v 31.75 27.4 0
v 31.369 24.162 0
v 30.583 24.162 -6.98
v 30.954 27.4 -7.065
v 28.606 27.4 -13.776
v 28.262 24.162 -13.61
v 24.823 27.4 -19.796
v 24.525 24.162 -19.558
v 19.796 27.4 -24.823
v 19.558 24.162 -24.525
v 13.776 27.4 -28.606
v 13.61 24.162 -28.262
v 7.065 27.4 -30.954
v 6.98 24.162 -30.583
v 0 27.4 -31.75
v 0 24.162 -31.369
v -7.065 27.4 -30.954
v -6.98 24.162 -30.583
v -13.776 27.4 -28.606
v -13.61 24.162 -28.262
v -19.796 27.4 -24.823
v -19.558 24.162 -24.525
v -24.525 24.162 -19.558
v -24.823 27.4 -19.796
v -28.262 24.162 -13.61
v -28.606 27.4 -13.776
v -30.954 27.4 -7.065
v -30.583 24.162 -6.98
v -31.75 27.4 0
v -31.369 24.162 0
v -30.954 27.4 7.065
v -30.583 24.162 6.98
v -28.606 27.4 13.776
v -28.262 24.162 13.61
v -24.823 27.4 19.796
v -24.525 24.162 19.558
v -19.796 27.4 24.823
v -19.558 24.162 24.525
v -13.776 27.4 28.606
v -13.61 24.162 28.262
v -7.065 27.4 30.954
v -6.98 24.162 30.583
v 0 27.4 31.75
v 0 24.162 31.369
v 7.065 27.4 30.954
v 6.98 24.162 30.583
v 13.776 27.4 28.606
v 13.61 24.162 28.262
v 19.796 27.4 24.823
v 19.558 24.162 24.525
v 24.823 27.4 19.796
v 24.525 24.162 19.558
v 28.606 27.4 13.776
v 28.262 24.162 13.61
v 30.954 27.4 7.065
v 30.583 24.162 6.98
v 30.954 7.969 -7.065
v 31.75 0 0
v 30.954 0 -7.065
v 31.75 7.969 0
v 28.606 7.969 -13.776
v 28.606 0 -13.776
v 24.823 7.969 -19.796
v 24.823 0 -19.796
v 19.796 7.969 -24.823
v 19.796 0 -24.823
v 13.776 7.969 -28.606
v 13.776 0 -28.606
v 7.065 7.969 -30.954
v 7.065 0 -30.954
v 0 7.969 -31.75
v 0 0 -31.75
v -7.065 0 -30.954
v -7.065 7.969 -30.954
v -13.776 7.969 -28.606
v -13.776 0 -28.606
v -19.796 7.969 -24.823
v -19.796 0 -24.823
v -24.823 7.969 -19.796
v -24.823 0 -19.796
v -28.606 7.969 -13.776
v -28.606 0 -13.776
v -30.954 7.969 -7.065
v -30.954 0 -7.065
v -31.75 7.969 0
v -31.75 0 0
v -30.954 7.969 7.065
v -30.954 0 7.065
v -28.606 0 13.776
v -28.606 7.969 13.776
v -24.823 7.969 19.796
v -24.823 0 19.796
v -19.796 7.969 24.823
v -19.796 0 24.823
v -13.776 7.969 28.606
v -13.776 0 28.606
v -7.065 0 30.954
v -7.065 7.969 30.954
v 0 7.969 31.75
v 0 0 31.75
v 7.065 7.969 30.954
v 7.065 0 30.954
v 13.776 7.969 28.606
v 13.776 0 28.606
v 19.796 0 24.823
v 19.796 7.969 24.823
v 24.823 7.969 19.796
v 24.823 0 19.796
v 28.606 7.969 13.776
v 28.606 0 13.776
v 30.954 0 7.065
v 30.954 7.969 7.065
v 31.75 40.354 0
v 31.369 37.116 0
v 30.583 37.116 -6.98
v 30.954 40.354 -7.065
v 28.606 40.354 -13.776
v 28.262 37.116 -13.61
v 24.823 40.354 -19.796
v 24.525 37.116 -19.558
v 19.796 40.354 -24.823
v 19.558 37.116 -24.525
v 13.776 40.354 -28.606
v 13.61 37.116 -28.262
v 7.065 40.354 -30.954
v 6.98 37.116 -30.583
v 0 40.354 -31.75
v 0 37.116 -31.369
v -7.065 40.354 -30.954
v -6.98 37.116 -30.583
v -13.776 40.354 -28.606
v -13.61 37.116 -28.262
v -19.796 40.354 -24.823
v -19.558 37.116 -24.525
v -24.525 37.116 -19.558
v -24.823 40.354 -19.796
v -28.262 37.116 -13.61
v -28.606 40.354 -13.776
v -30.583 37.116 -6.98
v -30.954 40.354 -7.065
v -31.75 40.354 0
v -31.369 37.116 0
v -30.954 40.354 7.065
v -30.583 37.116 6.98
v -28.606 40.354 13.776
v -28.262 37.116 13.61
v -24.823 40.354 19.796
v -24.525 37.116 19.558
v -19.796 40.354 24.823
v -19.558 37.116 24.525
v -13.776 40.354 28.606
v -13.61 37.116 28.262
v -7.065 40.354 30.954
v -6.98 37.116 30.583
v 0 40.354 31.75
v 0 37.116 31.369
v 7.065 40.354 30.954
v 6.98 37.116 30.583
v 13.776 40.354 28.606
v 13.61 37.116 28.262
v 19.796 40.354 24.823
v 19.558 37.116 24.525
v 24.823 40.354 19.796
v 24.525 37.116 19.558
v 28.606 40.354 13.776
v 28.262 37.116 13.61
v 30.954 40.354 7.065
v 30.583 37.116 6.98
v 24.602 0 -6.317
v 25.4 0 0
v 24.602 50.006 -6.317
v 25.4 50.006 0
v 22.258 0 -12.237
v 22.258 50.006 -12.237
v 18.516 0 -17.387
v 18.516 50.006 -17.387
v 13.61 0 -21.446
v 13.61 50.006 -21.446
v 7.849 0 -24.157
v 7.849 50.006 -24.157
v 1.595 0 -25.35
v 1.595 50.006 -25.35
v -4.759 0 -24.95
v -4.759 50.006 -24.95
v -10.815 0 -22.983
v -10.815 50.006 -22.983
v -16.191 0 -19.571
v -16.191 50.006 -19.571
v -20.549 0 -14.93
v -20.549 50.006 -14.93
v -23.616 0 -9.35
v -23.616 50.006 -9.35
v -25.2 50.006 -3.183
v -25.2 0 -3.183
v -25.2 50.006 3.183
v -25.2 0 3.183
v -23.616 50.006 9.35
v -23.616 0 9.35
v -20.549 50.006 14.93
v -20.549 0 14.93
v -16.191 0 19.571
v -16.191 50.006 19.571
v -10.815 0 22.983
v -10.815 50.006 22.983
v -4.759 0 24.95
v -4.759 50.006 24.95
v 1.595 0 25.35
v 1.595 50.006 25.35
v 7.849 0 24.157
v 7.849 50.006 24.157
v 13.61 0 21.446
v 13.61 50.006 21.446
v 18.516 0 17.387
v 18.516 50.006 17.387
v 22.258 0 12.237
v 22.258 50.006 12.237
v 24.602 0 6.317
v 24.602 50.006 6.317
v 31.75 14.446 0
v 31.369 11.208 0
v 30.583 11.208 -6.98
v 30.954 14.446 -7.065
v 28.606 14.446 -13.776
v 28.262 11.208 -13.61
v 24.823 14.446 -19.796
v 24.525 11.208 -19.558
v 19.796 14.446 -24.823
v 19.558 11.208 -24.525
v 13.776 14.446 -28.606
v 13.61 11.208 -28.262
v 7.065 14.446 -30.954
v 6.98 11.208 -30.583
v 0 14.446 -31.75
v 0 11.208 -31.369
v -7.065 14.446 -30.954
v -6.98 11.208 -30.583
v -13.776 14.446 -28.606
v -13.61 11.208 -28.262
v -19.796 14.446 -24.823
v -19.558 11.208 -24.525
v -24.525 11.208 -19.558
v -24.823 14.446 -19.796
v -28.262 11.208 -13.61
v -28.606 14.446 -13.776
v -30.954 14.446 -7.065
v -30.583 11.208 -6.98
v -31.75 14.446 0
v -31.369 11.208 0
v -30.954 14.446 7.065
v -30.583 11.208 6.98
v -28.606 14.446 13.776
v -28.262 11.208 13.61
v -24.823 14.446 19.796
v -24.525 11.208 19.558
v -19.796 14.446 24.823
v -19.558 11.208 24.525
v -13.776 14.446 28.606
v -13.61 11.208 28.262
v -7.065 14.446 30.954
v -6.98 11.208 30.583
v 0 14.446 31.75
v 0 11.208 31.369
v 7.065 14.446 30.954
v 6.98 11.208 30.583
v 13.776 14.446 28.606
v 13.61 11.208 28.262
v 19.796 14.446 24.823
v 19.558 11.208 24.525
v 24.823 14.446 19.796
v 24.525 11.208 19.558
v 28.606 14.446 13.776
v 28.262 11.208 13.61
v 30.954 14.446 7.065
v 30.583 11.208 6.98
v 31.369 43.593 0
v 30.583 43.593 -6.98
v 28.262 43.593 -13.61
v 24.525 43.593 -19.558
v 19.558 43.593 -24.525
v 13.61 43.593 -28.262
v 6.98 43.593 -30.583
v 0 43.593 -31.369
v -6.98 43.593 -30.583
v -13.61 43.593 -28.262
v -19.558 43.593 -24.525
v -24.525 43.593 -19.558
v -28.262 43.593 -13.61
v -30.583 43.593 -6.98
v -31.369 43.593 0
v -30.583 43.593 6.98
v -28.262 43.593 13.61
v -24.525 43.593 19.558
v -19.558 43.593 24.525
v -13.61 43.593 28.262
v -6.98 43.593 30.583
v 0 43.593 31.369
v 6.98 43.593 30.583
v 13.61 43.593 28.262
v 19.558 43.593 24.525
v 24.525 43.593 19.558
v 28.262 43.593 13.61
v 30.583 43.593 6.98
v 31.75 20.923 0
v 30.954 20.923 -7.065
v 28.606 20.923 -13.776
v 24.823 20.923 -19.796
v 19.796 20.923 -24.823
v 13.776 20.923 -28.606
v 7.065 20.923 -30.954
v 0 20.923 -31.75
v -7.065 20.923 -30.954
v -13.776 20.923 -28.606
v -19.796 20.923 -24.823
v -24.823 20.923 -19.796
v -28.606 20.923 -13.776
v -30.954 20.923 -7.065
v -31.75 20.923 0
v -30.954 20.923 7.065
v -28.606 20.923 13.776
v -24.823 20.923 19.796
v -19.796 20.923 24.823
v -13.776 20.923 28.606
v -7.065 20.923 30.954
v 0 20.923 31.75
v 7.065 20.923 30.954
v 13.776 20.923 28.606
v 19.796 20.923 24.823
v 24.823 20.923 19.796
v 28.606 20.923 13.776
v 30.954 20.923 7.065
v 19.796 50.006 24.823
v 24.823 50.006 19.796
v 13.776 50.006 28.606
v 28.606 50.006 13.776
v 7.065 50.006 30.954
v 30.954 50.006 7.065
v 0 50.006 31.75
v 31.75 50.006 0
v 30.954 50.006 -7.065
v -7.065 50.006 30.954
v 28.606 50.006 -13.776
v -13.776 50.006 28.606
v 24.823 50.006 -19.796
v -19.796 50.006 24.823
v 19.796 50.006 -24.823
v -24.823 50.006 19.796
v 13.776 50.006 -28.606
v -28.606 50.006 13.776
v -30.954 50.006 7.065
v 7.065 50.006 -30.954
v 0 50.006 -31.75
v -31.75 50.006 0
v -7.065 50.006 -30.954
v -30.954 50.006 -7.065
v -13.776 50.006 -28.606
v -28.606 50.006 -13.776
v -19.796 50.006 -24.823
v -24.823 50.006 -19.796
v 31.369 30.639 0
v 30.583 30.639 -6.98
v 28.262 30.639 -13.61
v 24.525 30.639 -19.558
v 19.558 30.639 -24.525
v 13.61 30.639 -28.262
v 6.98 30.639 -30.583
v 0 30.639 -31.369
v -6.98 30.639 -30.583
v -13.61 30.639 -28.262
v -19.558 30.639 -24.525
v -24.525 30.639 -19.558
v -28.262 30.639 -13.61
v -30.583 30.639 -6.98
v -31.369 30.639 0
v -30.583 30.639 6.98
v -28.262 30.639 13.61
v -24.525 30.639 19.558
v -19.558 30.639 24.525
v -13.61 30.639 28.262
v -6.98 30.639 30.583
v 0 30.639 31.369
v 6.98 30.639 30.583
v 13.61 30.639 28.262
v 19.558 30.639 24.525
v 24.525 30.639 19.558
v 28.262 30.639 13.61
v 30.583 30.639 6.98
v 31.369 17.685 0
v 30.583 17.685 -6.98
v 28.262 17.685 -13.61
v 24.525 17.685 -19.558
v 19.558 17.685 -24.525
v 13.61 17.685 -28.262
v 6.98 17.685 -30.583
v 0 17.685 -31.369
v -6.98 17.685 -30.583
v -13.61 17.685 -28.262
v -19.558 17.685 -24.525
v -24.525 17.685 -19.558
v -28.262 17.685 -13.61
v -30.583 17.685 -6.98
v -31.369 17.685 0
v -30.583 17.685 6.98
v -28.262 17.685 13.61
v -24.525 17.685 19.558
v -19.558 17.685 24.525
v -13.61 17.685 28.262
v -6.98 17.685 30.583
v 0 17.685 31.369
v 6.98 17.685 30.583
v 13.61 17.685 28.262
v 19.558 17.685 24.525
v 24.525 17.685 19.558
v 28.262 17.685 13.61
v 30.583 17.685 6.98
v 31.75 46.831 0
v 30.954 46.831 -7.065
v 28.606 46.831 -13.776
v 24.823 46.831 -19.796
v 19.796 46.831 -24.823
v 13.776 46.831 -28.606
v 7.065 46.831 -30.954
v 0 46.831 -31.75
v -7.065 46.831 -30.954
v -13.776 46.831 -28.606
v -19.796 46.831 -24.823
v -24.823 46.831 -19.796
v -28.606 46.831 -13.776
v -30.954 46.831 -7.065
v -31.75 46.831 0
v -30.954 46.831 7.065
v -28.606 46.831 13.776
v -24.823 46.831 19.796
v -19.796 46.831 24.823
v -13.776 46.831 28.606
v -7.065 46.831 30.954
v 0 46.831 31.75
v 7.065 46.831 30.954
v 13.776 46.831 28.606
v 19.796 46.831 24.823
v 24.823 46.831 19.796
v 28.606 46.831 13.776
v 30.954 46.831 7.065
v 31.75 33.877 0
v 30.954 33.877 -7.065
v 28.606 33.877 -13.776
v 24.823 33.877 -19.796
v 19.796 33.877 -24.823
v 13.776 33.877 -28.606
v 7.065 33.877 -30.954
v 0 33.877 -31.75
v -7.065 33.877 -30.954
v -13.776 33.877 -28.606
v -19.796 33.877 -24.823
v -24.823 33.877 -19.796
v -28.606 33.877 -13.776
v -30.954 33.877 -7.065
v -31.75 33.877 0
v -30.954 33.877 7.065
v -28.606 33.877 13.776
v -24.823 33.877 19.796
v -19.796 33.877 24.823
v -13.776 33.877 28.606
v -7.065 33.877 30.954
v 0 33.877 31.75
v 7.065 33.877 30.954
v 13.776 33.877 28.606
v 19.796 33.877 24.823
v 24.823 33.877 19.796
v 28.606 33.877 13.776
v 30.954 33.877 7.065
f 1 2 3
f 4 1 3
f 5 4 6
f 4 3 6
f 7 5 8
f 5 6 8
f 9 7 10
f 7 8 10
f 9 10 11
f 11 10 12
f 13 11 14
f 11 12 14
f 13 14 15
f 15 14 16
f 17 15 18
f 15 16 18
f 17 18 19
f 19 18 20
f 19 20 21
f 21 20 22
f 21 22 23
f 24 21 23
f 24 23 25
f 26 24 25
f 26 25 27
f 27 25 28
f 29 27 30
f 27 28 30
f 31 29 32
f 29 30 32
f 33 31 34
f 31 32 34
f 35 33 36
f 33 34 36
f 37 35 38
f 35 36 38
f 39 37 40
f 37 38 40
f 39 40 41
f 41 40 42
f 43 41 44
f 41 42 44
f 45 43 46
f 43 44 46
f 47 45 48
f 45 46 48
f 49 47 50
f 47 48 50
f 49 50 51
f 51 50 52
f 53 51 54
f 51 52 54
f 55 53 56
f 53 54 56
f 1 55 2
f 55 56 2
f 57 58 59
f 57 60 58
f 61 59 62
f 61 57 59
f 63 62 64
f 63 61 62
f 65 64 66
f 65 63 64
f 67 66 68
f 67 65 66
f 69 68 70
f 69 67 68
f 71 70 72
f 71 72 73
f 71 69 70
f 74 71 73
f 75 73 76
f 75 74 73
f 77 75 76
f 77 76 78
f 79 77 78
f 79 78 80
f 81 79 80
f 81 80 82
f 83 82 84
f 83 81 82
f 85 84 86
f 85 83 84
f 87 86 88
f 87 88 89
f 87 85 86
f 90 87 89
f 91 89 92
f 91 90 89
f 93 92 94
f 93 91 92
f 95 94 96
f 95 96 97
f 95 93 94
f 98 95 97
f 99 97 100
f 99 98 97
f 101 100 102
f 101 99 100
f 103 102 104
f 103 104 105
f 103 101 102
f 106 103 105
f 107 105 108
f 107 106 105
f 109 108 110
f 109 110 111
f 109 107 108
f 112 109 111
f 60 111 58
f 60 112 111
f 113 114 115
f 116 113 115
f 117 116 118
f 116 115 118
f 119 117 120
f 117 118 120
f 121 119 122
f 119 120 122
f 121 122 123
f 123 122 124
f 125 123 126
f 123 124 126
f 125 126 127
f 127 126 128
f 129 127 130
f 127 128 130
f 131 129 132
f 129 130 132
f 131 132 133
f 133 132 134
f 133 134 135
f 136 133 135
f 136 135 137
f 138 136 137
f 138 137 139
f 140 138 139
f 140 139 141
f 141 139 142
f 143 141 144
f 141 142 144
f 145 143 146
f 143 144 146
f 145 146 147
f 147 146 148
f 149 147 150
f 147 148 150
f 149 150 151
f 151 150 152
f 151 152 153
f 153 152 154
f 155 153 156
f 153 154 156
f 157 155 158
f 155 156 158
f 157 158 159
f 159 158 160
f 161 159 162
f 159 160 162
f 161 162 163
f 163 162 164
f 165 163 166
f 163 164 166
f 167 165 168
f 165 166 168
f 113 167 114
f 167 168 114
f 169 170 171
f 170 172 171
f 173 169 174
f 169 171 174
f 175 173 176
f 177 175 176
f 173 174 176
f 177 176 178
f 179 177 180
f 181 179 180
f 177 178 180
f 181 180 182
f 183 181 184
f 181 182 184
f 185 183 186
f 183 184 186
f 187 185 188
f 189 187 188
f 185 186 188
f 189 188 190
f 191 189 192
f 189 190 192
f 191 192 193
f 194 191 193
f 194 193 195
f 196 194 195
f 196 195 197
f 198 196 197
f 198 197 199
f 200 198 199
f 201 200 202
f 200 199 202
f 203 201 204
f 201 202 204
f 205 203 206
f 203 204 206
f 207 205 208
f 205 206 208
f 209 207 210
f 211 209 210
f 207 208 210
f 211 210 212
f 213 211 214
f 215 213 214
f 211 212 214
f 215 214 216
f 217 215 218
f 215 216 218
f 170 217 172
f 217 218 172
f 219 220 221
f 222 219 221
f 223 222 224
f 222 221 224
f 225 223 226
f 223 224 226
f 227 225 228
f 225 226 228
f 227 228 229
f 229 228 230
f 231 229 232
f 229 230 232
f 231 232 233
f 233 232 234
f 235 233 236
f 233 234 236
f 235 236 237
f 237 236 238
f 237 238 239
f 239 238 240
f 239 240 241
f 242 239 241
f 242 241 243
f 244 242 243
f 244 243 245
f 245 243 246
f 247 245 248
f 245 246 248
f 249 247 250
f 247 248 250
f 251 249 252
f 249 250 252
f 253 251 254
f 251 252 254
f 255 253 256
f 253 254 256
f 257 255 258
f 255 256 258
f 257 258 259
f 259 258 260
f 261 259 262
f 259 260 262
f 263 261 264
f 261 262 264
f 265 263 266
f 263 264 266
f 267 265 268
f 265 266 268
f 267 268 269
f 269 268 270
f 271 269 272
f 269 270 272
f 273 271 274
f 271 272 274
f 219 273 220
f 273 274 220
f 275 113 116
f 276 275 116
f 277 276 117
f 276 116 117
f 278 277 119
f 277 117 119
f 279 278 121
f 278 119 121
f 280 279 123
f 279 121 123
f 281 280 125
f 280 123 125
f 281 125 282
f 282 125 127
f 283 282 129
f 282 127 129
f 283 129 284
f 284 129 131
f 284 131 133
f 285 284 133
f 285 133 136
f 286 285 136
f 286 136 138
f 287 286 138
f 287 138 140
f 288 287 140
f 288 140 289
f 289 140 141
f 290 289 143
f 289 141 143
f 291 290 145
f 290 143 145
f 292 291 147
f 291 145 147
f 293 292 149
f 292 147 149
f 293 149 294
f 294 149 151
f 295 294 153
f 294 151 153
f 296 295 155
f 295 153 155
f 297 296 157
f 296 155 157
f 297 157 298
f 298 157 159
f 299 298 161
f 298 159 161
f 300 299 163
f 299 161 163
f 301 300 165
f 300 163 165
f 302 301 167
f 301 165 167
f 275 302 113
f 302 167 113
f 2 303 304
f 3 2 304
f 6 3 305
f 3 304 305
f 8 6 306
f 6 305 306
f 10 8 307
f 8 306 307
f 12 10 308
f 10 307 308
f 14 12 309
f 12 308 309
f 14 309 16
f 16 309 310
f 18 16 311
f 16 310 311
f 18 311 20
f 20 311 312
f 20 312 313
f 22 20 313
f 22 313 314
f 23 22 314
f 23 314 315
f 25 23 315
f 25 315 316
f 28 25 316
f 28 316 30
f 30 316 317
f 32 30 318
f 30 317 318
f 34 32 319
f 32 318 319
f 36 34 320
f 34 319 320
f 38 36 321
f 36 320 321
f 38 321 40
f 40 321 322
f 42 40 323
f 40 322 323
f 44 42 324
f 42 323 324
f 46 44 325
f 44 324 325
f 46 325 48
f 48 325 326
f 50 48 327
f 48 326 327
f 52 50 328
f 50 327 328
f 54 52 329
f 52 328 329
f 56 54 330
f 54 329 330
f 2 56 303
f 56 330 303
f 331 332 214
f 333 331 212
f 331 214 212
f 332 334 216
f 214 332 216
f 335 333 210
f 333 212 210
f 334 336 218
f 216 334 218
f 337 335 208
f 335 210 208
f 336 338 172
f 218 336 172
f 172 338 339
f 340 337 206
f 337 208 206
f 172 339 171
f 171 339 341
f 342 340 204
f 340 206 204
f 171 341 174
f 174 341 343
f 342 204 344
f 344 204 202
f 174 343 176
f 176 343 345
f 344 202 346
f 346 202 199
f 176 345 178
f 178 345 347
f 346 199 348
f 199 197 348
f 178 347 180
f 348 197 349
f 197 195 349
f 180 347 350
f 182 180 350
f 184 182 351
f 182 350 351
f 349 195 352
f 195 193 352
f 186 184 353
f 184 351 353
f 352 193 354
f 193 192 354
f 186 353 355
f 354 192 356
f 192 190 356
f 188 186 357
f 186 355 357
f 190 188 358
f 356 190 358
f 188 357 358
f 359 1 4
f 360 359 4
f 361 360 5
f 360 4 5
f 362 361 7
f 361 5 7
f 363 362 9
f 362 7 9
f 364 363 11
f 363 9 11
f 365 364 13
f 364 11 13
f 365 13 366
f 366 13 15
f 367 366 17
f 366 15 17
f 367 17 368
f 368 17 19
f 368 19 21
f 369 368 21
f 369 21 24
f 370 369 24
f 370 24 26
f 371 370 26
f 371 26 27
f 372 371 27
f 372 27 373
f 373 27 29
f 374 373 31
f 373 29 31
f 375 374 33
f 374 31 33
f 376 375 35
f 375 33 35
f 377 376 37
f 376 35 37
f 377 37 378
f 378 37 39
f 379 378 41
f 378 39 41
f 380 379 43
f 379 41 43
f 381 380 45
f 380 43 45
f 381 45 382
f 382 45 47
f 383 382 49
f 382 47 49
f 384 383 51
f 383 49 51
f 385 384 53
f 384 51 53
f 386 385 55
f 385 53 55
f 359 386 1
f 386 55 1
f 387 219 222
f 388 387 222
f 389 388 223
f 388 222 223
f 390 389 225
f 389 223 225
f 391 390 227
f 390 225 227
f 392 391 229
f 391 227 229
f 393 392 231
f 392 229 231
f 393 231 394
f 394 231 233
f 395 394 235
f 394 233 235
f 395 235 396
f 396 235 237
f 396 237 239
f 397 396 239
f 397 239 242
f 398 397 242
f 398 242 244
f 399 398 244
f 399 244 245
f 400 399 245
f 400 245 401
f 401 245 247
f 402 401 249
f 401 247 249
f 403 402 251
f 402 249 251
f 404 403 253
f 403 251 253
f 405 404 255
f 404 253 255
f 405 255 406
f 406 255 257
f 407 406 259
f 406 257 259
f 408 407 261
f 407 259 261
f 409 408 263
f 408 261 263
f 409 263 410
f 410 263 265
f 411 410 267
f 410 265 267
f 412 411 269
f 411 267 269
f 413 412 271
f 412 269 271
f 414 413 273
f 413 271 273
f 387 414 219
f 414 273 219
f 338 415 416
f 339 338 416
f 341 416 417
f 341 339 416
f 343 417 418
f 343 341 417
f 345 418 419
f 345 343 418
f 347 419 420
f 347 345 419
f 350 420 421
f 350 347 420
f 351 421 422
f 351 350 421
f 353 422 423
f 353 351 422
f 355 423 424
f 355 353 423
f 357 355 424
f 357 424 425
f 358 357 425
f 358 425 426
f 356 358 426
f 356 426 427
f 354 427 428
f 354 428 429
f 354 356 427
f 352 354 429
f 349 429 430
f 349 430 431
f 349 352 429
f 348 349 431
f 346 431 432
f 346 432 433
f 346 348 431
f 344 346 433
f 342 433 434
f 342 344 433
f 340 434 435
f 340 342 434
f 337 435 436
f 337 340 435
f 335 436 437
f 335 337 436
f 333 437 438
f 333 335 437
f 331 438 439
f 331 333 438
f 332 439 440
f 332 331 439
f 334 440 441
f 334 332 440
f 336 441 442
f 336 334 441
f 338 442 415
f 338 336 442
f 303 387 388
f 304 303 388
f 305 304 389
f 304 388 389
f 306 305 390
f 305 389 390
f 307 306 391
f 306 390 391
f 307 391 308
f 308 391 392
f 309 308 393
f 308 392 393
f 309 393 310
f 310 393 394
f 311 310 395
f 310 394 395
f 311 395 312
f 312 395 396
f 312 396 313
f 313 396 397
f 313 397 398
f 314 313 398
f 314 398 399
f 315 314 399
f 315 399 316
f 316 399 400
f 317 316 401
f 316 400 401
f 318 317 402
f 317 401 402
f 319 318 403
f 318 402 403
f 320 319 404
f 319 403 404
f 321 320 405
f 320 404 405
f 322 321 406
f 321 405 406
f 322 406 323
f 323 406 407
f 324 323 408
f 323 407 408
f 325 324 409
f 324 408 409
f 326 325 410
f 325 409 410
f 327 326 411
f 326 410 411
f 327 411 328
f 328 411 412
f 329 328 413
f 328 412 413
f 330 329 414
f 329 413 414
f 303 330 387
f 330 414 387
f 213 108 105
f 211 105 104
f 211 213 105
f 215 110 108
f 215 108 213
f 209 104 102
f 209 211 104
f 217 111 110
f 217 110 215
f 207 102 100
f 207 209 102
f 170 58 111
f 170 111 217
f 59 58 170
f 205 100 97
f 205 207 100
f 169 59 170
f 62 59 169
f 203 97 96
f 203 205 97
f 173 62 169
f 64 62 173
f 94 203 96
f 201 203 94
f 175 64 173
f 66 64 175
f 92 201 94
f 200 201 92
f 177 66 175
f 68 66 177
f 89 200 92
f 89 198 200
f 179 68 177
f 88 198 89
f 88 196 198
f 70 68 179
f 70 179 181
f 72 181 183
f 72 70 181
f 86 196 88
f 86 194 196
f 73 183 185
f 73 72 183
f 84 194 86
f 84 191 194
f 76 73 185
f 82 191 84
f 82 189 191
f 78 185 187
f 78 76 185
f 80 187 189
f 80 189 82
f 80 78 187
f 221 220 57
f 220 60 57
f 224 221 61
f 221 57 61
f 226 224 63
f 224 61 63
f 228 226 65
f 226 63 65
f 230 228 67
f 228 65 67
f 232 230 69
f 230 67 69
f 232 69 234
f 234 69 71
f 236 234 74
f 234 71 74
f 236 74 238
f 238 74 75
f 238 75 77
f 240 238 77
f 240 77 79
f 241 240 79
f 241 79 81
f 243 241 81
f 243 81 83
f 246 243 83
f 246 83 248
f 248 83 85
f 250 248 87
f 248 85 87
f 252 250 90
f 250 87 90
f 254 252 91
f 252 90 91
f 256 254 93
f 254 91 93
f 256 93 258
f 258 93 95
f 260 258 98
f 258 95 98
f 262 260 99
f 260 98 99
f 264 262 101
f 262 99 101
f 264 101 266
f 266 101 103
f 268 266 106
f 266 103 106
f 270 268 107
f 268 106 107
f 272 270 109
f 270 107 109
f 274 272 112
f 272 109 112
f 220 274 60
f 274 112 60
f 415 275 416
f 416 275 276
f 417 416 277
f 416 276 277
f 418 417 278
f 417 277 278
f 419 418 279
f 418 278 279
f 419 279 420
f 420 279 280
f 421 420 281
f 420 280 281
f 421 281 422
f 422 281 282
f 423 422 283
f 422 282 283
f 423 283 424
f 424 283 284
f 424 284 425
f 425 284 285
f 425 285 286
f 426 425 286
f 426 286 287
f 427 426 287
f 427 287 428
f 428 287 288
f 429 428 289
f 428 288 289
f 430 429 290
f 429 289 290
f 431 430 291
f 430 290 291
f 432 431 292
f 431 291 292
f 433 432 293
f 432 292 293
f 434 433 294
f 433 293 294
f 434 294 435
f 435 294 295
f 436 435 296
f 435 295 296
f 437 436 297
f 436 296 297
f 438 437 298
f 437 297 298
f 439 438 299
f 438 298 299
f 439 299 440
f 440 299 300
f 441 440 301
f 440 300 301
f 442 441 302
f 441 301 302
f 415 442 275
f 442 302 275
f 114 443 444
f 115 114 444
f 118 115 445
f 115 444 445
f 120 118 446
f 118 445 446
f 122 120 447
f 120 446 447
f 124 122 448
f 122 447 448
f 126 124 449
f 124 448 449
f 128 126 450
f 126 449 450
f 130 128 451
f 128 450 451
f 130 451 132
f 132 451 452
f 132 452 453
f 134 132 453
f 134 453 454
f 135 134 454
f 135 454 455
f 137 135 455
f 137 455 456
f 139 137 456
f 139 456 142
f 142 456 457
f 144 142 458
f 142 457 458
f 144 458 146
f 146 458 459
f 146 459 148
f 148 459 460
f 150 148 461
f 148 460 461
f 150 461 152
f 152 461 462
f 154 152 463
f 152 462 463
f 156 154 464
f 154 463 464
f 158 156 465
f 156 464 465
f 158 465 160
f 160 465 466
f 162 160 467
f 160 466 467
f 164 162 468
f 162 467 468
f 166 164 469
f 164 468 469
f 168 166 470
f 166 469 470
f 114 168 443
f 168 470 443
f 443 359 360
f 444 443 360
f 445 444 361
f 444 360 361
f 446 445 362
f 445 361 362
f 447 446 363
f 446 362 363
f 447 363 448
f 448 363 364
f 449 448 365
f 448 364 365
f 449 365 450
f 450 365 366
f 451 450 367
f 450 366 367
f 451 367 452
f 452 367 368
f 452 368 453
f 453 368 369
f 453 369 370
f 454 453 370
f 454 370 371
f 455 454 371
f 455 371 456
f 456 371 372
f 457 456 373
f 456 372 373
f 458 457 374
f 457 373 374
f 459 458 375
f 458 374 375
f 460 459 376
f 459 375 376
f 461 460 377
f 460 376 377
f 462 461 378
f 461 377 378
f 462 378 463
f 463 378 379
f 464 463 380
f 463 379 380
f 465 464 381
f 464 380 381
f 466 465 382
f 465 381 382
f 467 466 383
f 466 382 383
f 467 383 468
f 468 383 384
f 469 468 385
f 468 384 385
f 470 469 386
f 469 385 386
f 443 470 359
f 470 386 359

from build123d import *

# Parameters (mm, degrees)
SKETCH2_W       = 6.35
SKETCH2_H       = 50.00625
LPATTERN1_COUNT = 6
LPATTERN1_PITCH = 6.477


with BuildPart() as part:
    # Sketch2 → Revolve1 (revolve)
    with BuildSketch(Plane.XY):
        with Locations((28.575, 25.003125)):
            Rectangle(SKETCH2_W, SKETCH2_H)
    revolve(axis=Axis((0, -40.656569806, 0), (0, 1, 0)))

    # Sketch3 → Cut-Revolve1 (revolve, cut)
    with BuildSketch(Plane.XY):
        Polygon((31.75, 46.83125), (31.369, 43.59275), (31.75, 40.35425), align=None)
    cut_revolve1 = revolve(axis=Axis((0, -40.656569806, 0), (0, 1, 0)), mode=Mode.SUBTRACT)

    # LPattern1: Cut-Revolve1 ×6
    with Locations(*[(0, -i * LPATTERN1_PITCH, 0) for i in range(1, LPATTERN1_COUNT)]):
        add(cut_revolve1, mode=Mode.SUBTRACT)


solid = part.part
